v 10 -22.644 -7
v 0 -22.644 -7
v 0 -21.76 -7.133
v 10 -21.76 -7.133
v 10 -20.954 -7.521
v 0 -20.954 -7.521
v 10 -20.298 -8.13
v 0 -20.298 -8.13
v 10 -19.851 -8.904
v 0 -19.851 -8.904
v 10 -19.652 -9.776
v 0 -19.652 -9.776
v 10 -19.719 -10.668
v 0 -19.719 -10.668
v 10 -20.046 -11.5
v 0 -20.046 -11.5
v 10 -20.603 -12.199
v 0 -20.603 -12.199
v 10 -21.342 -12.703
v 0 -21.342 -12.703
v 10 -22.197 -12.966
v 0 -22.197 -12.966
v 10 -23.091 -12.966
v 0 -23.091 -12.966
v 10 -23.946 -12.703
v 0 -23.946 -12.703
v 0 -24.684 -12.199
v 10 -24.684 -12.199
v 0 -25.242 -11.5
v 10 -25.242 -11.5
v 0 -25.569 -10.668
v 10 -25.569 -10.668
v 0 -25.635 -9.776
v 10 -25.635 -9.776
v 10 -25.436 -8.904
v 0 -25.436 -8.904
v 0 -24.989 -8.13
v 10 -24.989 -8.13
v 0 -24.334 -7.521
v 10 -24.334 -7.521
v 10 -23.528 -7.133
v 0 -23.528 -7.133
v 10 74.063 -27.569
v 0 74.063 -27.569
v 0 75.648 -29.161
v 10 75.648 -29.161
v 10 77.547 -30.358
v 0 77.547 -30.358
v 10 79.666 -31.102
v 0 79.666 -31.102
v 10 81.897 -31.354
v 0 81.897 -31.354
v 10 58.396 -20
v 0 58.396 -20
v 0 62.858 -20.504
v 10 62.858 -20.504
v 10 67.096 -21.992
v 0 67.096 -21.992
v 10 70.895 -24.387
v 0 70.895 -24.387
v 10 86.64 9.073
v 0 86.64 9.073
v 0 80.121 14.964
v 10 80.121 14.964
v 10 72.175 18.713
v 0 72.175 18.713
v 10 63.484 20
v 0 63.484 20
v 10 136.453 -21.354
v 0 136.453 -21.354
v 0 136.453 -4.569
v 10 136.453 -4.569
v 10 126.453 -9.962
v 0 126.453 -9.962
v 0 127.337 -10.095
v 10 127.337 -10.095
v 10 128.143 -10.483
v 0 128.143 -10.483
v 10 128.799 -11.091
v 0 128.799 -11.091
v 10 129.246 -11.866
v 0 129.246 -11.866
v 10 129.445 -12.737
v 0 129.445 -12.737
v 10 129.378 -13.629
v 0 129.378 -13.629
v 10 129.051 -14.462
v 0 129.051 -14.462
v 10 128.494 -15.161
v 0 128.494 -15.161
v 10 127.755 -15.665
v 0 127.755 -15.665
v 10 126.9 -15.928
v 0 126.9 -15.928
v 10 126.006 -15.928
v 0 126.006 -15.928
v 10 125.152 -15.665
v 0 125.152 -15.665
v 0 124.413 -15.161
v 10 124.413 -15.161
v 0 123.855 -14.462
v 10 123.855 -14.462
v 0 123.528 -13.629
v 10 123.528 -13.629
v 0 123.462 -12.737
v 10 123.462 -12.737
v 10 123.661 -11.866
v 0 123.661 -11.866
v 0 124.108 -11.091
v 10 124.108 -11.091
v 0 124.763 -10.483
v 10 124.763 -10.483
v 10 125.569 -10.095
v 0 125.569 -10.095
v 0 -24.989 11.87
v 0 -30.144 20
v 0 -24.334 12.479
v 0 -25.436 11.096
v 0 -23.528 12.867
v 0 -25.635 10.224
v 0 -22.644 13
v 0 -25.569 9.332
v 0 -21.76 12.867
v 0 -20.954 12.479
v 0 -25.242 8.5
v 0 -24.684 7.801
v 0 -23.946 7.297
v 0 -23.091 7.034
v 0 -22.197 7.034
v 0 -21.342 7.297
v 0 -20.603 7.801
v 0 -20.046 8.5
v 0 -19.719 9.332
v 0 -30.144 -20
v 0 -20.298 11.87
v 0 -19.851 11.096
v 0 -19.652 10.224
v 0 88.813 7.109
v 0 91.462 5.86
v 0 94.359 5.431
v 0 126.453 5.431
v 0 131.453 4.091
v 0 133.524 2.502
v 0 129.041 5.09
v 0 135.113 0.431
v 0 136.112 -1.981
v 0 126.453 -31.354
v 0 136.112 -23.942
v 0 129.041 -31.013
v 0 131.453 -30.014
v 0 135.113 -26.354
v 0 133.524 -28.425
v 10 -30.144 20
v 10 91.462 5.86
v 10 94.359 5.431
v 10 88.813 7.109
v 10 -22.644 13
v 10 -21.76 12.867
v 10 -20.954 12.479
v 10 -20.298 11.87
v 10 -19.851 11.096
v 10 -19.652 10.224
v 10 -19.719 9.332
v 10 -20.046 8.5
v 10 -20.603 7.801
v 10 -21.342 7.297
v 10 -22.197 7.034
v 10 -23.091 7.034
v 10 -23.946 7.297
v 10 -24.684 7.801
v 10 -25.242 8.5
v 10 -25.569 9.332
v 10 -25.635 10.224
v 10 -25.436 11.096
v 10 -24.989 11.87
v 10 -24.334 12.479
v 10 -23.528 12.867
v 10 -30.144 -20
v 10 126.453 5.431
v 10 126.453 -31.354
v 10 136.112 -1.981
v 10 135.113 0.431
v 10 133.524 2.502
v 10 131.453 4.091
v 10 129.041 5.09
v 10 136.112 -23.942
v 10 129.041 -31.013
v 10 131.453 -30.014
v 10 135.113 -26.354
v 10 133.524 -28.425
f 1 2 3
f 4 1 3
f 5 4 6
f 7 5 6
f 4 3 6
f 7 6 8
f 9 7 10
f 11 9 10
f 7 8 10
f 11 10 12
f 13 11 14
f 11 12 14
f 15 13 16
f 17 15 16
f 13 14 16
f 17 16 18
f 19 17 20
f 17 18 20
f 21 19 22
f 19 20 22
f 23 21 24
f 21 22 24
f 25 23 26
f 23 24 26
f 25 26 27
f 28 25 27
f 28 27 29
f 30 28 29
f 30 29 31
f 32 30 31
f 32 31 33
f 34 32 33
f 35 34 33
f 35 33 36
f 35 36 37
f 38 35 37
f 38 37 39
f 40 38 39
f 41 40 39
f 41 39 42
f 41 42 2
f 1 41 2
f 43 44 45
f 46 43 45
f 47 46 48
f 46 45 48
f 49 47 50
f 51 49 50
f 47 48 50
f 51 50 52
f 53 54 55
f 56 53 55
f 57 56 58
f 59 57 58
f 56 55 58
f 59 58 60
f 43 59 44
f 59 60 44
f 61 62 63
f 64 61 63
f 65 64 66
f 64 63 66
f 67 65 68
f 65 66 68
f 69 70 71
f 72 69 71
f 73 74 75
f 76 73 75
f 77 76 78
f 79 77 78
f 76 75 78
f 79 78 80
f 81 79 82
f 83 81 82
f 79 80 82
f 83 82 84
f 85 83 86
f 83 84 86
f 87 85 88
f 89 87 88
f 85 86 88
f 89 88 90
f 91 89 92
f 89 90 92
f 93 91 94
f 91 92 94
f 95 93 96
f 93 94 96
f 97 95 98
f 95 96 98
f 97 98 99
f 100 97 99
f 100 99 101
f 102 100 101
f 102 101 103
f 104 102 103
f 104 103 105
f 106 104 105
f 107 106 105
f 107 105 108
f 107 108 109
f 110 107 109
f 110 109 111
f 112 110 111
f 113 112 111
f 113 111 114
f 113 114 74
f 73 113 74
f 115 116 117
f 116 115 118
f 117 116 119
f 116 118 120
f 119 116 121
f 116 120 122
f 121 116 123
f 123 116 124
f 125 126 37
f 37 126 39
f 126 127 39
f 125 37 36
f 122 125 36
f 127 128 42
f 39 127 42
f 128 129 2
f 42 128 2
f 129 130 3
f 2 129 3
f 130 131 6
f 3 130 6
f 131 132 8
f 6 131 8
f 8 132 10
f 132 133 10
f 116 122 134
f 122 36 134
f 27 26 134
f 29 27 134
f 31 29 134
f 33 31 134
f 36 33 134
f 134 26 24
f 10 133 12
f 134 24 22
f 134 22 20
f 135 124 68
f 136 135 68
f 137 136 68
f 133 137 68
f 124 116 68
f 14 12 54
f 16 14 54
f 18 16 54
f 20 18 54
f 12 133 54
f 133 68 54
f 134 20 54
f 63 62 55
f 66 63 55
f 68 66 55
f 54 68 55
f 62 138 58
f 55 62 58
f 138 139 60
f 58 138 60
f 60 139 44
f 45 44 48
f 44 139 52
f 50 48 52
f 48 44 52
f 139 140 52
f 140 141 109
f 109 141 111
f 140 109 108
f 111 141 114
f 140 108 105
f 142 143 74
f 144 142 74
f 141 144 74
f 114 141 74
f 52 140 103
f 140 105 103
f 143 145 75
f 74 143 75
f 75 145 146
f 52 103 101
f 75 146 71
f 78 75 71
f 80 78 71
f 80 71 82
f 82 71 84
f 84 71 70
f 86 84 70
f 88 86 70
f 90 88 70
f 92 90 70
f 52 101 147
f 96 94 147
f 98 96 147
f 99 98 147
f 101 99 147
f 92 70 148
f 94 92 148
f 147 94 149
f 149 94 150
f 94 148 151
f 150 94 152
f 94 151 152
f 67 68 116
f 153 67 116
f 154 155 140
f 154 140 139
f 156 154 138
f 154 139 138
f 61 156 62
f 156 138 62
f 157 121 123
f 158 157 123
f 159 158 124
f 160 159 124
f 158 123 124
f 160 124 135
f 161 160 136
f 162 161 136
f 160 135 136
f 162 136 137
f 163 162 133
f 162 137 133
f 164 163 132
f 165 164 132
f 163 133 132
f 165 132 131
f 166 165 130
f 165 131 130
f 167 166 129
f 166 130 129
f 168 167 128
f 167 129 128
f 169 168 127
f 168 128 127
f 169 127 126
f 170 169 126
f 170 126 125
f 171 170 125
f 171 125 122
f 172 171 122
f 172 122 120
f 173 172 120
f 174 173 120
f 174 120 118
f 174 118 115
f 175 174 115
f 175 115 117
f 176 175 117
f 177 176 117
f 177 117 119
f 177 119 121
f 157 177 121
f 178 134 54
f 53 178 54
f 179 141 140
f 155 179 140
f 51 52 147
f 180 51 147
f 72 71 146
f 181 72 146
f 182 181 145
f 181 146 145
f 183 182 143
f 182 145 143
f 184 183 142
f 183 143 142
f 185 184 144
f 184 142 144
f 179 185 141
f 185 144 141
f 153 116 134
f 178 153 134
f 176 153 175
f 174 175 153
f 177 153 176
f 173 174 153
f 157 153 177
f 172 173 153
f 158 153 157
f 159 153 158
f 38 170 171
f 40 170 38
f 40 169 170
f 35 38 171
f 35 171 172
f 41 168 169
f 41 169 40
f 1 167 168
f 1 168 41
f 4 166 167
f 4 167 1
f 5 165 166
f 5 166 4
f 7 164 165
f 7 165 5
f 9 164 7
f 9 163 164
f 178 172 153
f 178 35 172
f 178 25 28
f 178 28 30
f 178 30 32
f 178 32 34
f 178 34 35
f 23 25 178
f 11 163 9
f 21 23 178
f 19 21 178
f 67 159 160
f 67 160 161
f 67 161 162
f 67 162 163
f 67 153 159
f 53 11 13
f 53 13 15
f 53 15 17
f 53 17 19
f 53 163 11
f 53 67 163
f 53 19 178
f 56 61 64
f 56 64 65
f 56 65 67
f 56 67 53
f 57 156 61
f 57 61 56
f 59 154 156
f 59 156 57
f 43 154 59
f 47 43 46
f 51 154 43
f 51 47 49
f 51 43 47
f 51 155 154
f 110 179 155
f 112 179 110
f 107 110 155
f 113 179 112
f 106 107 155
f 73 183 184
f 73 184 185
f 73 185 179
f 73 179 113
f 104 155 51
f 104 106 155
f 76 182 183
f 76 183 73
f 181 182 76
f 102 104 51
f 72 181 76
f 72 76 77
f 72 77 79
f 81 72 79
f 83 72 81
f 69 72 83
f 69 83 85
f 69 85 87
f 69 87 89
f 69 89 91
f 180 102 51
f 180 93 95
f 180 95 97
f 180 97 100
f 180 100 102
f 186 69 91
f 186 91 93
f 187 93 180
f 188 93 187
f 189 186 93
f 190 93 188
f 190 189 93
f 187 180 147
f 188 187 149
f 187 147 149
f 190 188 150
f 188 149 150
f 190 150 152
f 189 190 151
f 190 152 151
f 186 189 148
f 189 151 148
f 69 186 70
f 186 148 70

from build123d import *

# Parameters (mm, degrees)
EXTRUDE_1_DEPTH     = 10
SKETCH_2_R          = 3
CUT_EXTRUDE_1_DEPTH = 25


with BuildPart() as part:
    # Эскиз1 → Вытянуть1 (new body)
    with BuildSketch(Plane(origin=(0, 0, 0), x_dir=(0, 0, -1), z_dir=(1, 0, 0))):
        with BuildLine():
            Line((-19.99990009, 63.483695787), (-19.99990009, -30.143863535))
            Line((-19.99990009, -30.143863535), (20.00009991, -30.143863535))
            Line((20.00009991, -30.143863535), (20.00009991, 58.395614664))
            ThreePointArc((20.00009991, 58.395614664), (21.991555525, 67.095748523), (27.569332826, 74.063289338))
            ThreePointArc((27.569332826, 74.063289338), (30.358221476, 77.547059746), (31.353949284, 81.897126676))
            Line((31.353949284, 81.897126676), (31.353949284, 126.453197444))
            ThreePointArc((31.353949284, 126.453197444), (28.425017096, 133.524265256), (21.353949284, 136.453197444))
            Line((21.353949284, 136.453197444), (4.569303476, 136.453197444))
            ThreePointArc((4.569303476, 136.453197444), (-2.501764335, 133.524265256), (-5.430696524, 126.453197444))
            Line((-5.430696524, 126.453197444), (-5.430696524, 94.358841013))
            ThreePointArc((-5.430696524, 94.358841013), (-6.386997306, 90.091347082), (-9.072997415, 86.640054707))
            ThreePointArc((-9.072997415, 86.640054707), (-17.130997744, 76.286177582), (-19.99990009, 63.483695787))
        make_face()
    extrude(amount=EXTRUDE_1_DEPTH)

    # Эскиз2 → Вырез-Вытянуть1 (cut)
    with BuildSketch(Plane.ZY):
        with Locations((10, -22.643863535)):
            Circle(SKETCH_2_R)
        with Locations((-10, -22.643863535)):
            Circle(SKETCH_2_R)
        with Locations((-12.96162638, 126.453197444)):
            Circle(SKETCH_2_R)
    extrude(amount=-CUT_EXTRUDE_1_DEPTH, mode=Mode.SUBTRACT)


solid = part.part
